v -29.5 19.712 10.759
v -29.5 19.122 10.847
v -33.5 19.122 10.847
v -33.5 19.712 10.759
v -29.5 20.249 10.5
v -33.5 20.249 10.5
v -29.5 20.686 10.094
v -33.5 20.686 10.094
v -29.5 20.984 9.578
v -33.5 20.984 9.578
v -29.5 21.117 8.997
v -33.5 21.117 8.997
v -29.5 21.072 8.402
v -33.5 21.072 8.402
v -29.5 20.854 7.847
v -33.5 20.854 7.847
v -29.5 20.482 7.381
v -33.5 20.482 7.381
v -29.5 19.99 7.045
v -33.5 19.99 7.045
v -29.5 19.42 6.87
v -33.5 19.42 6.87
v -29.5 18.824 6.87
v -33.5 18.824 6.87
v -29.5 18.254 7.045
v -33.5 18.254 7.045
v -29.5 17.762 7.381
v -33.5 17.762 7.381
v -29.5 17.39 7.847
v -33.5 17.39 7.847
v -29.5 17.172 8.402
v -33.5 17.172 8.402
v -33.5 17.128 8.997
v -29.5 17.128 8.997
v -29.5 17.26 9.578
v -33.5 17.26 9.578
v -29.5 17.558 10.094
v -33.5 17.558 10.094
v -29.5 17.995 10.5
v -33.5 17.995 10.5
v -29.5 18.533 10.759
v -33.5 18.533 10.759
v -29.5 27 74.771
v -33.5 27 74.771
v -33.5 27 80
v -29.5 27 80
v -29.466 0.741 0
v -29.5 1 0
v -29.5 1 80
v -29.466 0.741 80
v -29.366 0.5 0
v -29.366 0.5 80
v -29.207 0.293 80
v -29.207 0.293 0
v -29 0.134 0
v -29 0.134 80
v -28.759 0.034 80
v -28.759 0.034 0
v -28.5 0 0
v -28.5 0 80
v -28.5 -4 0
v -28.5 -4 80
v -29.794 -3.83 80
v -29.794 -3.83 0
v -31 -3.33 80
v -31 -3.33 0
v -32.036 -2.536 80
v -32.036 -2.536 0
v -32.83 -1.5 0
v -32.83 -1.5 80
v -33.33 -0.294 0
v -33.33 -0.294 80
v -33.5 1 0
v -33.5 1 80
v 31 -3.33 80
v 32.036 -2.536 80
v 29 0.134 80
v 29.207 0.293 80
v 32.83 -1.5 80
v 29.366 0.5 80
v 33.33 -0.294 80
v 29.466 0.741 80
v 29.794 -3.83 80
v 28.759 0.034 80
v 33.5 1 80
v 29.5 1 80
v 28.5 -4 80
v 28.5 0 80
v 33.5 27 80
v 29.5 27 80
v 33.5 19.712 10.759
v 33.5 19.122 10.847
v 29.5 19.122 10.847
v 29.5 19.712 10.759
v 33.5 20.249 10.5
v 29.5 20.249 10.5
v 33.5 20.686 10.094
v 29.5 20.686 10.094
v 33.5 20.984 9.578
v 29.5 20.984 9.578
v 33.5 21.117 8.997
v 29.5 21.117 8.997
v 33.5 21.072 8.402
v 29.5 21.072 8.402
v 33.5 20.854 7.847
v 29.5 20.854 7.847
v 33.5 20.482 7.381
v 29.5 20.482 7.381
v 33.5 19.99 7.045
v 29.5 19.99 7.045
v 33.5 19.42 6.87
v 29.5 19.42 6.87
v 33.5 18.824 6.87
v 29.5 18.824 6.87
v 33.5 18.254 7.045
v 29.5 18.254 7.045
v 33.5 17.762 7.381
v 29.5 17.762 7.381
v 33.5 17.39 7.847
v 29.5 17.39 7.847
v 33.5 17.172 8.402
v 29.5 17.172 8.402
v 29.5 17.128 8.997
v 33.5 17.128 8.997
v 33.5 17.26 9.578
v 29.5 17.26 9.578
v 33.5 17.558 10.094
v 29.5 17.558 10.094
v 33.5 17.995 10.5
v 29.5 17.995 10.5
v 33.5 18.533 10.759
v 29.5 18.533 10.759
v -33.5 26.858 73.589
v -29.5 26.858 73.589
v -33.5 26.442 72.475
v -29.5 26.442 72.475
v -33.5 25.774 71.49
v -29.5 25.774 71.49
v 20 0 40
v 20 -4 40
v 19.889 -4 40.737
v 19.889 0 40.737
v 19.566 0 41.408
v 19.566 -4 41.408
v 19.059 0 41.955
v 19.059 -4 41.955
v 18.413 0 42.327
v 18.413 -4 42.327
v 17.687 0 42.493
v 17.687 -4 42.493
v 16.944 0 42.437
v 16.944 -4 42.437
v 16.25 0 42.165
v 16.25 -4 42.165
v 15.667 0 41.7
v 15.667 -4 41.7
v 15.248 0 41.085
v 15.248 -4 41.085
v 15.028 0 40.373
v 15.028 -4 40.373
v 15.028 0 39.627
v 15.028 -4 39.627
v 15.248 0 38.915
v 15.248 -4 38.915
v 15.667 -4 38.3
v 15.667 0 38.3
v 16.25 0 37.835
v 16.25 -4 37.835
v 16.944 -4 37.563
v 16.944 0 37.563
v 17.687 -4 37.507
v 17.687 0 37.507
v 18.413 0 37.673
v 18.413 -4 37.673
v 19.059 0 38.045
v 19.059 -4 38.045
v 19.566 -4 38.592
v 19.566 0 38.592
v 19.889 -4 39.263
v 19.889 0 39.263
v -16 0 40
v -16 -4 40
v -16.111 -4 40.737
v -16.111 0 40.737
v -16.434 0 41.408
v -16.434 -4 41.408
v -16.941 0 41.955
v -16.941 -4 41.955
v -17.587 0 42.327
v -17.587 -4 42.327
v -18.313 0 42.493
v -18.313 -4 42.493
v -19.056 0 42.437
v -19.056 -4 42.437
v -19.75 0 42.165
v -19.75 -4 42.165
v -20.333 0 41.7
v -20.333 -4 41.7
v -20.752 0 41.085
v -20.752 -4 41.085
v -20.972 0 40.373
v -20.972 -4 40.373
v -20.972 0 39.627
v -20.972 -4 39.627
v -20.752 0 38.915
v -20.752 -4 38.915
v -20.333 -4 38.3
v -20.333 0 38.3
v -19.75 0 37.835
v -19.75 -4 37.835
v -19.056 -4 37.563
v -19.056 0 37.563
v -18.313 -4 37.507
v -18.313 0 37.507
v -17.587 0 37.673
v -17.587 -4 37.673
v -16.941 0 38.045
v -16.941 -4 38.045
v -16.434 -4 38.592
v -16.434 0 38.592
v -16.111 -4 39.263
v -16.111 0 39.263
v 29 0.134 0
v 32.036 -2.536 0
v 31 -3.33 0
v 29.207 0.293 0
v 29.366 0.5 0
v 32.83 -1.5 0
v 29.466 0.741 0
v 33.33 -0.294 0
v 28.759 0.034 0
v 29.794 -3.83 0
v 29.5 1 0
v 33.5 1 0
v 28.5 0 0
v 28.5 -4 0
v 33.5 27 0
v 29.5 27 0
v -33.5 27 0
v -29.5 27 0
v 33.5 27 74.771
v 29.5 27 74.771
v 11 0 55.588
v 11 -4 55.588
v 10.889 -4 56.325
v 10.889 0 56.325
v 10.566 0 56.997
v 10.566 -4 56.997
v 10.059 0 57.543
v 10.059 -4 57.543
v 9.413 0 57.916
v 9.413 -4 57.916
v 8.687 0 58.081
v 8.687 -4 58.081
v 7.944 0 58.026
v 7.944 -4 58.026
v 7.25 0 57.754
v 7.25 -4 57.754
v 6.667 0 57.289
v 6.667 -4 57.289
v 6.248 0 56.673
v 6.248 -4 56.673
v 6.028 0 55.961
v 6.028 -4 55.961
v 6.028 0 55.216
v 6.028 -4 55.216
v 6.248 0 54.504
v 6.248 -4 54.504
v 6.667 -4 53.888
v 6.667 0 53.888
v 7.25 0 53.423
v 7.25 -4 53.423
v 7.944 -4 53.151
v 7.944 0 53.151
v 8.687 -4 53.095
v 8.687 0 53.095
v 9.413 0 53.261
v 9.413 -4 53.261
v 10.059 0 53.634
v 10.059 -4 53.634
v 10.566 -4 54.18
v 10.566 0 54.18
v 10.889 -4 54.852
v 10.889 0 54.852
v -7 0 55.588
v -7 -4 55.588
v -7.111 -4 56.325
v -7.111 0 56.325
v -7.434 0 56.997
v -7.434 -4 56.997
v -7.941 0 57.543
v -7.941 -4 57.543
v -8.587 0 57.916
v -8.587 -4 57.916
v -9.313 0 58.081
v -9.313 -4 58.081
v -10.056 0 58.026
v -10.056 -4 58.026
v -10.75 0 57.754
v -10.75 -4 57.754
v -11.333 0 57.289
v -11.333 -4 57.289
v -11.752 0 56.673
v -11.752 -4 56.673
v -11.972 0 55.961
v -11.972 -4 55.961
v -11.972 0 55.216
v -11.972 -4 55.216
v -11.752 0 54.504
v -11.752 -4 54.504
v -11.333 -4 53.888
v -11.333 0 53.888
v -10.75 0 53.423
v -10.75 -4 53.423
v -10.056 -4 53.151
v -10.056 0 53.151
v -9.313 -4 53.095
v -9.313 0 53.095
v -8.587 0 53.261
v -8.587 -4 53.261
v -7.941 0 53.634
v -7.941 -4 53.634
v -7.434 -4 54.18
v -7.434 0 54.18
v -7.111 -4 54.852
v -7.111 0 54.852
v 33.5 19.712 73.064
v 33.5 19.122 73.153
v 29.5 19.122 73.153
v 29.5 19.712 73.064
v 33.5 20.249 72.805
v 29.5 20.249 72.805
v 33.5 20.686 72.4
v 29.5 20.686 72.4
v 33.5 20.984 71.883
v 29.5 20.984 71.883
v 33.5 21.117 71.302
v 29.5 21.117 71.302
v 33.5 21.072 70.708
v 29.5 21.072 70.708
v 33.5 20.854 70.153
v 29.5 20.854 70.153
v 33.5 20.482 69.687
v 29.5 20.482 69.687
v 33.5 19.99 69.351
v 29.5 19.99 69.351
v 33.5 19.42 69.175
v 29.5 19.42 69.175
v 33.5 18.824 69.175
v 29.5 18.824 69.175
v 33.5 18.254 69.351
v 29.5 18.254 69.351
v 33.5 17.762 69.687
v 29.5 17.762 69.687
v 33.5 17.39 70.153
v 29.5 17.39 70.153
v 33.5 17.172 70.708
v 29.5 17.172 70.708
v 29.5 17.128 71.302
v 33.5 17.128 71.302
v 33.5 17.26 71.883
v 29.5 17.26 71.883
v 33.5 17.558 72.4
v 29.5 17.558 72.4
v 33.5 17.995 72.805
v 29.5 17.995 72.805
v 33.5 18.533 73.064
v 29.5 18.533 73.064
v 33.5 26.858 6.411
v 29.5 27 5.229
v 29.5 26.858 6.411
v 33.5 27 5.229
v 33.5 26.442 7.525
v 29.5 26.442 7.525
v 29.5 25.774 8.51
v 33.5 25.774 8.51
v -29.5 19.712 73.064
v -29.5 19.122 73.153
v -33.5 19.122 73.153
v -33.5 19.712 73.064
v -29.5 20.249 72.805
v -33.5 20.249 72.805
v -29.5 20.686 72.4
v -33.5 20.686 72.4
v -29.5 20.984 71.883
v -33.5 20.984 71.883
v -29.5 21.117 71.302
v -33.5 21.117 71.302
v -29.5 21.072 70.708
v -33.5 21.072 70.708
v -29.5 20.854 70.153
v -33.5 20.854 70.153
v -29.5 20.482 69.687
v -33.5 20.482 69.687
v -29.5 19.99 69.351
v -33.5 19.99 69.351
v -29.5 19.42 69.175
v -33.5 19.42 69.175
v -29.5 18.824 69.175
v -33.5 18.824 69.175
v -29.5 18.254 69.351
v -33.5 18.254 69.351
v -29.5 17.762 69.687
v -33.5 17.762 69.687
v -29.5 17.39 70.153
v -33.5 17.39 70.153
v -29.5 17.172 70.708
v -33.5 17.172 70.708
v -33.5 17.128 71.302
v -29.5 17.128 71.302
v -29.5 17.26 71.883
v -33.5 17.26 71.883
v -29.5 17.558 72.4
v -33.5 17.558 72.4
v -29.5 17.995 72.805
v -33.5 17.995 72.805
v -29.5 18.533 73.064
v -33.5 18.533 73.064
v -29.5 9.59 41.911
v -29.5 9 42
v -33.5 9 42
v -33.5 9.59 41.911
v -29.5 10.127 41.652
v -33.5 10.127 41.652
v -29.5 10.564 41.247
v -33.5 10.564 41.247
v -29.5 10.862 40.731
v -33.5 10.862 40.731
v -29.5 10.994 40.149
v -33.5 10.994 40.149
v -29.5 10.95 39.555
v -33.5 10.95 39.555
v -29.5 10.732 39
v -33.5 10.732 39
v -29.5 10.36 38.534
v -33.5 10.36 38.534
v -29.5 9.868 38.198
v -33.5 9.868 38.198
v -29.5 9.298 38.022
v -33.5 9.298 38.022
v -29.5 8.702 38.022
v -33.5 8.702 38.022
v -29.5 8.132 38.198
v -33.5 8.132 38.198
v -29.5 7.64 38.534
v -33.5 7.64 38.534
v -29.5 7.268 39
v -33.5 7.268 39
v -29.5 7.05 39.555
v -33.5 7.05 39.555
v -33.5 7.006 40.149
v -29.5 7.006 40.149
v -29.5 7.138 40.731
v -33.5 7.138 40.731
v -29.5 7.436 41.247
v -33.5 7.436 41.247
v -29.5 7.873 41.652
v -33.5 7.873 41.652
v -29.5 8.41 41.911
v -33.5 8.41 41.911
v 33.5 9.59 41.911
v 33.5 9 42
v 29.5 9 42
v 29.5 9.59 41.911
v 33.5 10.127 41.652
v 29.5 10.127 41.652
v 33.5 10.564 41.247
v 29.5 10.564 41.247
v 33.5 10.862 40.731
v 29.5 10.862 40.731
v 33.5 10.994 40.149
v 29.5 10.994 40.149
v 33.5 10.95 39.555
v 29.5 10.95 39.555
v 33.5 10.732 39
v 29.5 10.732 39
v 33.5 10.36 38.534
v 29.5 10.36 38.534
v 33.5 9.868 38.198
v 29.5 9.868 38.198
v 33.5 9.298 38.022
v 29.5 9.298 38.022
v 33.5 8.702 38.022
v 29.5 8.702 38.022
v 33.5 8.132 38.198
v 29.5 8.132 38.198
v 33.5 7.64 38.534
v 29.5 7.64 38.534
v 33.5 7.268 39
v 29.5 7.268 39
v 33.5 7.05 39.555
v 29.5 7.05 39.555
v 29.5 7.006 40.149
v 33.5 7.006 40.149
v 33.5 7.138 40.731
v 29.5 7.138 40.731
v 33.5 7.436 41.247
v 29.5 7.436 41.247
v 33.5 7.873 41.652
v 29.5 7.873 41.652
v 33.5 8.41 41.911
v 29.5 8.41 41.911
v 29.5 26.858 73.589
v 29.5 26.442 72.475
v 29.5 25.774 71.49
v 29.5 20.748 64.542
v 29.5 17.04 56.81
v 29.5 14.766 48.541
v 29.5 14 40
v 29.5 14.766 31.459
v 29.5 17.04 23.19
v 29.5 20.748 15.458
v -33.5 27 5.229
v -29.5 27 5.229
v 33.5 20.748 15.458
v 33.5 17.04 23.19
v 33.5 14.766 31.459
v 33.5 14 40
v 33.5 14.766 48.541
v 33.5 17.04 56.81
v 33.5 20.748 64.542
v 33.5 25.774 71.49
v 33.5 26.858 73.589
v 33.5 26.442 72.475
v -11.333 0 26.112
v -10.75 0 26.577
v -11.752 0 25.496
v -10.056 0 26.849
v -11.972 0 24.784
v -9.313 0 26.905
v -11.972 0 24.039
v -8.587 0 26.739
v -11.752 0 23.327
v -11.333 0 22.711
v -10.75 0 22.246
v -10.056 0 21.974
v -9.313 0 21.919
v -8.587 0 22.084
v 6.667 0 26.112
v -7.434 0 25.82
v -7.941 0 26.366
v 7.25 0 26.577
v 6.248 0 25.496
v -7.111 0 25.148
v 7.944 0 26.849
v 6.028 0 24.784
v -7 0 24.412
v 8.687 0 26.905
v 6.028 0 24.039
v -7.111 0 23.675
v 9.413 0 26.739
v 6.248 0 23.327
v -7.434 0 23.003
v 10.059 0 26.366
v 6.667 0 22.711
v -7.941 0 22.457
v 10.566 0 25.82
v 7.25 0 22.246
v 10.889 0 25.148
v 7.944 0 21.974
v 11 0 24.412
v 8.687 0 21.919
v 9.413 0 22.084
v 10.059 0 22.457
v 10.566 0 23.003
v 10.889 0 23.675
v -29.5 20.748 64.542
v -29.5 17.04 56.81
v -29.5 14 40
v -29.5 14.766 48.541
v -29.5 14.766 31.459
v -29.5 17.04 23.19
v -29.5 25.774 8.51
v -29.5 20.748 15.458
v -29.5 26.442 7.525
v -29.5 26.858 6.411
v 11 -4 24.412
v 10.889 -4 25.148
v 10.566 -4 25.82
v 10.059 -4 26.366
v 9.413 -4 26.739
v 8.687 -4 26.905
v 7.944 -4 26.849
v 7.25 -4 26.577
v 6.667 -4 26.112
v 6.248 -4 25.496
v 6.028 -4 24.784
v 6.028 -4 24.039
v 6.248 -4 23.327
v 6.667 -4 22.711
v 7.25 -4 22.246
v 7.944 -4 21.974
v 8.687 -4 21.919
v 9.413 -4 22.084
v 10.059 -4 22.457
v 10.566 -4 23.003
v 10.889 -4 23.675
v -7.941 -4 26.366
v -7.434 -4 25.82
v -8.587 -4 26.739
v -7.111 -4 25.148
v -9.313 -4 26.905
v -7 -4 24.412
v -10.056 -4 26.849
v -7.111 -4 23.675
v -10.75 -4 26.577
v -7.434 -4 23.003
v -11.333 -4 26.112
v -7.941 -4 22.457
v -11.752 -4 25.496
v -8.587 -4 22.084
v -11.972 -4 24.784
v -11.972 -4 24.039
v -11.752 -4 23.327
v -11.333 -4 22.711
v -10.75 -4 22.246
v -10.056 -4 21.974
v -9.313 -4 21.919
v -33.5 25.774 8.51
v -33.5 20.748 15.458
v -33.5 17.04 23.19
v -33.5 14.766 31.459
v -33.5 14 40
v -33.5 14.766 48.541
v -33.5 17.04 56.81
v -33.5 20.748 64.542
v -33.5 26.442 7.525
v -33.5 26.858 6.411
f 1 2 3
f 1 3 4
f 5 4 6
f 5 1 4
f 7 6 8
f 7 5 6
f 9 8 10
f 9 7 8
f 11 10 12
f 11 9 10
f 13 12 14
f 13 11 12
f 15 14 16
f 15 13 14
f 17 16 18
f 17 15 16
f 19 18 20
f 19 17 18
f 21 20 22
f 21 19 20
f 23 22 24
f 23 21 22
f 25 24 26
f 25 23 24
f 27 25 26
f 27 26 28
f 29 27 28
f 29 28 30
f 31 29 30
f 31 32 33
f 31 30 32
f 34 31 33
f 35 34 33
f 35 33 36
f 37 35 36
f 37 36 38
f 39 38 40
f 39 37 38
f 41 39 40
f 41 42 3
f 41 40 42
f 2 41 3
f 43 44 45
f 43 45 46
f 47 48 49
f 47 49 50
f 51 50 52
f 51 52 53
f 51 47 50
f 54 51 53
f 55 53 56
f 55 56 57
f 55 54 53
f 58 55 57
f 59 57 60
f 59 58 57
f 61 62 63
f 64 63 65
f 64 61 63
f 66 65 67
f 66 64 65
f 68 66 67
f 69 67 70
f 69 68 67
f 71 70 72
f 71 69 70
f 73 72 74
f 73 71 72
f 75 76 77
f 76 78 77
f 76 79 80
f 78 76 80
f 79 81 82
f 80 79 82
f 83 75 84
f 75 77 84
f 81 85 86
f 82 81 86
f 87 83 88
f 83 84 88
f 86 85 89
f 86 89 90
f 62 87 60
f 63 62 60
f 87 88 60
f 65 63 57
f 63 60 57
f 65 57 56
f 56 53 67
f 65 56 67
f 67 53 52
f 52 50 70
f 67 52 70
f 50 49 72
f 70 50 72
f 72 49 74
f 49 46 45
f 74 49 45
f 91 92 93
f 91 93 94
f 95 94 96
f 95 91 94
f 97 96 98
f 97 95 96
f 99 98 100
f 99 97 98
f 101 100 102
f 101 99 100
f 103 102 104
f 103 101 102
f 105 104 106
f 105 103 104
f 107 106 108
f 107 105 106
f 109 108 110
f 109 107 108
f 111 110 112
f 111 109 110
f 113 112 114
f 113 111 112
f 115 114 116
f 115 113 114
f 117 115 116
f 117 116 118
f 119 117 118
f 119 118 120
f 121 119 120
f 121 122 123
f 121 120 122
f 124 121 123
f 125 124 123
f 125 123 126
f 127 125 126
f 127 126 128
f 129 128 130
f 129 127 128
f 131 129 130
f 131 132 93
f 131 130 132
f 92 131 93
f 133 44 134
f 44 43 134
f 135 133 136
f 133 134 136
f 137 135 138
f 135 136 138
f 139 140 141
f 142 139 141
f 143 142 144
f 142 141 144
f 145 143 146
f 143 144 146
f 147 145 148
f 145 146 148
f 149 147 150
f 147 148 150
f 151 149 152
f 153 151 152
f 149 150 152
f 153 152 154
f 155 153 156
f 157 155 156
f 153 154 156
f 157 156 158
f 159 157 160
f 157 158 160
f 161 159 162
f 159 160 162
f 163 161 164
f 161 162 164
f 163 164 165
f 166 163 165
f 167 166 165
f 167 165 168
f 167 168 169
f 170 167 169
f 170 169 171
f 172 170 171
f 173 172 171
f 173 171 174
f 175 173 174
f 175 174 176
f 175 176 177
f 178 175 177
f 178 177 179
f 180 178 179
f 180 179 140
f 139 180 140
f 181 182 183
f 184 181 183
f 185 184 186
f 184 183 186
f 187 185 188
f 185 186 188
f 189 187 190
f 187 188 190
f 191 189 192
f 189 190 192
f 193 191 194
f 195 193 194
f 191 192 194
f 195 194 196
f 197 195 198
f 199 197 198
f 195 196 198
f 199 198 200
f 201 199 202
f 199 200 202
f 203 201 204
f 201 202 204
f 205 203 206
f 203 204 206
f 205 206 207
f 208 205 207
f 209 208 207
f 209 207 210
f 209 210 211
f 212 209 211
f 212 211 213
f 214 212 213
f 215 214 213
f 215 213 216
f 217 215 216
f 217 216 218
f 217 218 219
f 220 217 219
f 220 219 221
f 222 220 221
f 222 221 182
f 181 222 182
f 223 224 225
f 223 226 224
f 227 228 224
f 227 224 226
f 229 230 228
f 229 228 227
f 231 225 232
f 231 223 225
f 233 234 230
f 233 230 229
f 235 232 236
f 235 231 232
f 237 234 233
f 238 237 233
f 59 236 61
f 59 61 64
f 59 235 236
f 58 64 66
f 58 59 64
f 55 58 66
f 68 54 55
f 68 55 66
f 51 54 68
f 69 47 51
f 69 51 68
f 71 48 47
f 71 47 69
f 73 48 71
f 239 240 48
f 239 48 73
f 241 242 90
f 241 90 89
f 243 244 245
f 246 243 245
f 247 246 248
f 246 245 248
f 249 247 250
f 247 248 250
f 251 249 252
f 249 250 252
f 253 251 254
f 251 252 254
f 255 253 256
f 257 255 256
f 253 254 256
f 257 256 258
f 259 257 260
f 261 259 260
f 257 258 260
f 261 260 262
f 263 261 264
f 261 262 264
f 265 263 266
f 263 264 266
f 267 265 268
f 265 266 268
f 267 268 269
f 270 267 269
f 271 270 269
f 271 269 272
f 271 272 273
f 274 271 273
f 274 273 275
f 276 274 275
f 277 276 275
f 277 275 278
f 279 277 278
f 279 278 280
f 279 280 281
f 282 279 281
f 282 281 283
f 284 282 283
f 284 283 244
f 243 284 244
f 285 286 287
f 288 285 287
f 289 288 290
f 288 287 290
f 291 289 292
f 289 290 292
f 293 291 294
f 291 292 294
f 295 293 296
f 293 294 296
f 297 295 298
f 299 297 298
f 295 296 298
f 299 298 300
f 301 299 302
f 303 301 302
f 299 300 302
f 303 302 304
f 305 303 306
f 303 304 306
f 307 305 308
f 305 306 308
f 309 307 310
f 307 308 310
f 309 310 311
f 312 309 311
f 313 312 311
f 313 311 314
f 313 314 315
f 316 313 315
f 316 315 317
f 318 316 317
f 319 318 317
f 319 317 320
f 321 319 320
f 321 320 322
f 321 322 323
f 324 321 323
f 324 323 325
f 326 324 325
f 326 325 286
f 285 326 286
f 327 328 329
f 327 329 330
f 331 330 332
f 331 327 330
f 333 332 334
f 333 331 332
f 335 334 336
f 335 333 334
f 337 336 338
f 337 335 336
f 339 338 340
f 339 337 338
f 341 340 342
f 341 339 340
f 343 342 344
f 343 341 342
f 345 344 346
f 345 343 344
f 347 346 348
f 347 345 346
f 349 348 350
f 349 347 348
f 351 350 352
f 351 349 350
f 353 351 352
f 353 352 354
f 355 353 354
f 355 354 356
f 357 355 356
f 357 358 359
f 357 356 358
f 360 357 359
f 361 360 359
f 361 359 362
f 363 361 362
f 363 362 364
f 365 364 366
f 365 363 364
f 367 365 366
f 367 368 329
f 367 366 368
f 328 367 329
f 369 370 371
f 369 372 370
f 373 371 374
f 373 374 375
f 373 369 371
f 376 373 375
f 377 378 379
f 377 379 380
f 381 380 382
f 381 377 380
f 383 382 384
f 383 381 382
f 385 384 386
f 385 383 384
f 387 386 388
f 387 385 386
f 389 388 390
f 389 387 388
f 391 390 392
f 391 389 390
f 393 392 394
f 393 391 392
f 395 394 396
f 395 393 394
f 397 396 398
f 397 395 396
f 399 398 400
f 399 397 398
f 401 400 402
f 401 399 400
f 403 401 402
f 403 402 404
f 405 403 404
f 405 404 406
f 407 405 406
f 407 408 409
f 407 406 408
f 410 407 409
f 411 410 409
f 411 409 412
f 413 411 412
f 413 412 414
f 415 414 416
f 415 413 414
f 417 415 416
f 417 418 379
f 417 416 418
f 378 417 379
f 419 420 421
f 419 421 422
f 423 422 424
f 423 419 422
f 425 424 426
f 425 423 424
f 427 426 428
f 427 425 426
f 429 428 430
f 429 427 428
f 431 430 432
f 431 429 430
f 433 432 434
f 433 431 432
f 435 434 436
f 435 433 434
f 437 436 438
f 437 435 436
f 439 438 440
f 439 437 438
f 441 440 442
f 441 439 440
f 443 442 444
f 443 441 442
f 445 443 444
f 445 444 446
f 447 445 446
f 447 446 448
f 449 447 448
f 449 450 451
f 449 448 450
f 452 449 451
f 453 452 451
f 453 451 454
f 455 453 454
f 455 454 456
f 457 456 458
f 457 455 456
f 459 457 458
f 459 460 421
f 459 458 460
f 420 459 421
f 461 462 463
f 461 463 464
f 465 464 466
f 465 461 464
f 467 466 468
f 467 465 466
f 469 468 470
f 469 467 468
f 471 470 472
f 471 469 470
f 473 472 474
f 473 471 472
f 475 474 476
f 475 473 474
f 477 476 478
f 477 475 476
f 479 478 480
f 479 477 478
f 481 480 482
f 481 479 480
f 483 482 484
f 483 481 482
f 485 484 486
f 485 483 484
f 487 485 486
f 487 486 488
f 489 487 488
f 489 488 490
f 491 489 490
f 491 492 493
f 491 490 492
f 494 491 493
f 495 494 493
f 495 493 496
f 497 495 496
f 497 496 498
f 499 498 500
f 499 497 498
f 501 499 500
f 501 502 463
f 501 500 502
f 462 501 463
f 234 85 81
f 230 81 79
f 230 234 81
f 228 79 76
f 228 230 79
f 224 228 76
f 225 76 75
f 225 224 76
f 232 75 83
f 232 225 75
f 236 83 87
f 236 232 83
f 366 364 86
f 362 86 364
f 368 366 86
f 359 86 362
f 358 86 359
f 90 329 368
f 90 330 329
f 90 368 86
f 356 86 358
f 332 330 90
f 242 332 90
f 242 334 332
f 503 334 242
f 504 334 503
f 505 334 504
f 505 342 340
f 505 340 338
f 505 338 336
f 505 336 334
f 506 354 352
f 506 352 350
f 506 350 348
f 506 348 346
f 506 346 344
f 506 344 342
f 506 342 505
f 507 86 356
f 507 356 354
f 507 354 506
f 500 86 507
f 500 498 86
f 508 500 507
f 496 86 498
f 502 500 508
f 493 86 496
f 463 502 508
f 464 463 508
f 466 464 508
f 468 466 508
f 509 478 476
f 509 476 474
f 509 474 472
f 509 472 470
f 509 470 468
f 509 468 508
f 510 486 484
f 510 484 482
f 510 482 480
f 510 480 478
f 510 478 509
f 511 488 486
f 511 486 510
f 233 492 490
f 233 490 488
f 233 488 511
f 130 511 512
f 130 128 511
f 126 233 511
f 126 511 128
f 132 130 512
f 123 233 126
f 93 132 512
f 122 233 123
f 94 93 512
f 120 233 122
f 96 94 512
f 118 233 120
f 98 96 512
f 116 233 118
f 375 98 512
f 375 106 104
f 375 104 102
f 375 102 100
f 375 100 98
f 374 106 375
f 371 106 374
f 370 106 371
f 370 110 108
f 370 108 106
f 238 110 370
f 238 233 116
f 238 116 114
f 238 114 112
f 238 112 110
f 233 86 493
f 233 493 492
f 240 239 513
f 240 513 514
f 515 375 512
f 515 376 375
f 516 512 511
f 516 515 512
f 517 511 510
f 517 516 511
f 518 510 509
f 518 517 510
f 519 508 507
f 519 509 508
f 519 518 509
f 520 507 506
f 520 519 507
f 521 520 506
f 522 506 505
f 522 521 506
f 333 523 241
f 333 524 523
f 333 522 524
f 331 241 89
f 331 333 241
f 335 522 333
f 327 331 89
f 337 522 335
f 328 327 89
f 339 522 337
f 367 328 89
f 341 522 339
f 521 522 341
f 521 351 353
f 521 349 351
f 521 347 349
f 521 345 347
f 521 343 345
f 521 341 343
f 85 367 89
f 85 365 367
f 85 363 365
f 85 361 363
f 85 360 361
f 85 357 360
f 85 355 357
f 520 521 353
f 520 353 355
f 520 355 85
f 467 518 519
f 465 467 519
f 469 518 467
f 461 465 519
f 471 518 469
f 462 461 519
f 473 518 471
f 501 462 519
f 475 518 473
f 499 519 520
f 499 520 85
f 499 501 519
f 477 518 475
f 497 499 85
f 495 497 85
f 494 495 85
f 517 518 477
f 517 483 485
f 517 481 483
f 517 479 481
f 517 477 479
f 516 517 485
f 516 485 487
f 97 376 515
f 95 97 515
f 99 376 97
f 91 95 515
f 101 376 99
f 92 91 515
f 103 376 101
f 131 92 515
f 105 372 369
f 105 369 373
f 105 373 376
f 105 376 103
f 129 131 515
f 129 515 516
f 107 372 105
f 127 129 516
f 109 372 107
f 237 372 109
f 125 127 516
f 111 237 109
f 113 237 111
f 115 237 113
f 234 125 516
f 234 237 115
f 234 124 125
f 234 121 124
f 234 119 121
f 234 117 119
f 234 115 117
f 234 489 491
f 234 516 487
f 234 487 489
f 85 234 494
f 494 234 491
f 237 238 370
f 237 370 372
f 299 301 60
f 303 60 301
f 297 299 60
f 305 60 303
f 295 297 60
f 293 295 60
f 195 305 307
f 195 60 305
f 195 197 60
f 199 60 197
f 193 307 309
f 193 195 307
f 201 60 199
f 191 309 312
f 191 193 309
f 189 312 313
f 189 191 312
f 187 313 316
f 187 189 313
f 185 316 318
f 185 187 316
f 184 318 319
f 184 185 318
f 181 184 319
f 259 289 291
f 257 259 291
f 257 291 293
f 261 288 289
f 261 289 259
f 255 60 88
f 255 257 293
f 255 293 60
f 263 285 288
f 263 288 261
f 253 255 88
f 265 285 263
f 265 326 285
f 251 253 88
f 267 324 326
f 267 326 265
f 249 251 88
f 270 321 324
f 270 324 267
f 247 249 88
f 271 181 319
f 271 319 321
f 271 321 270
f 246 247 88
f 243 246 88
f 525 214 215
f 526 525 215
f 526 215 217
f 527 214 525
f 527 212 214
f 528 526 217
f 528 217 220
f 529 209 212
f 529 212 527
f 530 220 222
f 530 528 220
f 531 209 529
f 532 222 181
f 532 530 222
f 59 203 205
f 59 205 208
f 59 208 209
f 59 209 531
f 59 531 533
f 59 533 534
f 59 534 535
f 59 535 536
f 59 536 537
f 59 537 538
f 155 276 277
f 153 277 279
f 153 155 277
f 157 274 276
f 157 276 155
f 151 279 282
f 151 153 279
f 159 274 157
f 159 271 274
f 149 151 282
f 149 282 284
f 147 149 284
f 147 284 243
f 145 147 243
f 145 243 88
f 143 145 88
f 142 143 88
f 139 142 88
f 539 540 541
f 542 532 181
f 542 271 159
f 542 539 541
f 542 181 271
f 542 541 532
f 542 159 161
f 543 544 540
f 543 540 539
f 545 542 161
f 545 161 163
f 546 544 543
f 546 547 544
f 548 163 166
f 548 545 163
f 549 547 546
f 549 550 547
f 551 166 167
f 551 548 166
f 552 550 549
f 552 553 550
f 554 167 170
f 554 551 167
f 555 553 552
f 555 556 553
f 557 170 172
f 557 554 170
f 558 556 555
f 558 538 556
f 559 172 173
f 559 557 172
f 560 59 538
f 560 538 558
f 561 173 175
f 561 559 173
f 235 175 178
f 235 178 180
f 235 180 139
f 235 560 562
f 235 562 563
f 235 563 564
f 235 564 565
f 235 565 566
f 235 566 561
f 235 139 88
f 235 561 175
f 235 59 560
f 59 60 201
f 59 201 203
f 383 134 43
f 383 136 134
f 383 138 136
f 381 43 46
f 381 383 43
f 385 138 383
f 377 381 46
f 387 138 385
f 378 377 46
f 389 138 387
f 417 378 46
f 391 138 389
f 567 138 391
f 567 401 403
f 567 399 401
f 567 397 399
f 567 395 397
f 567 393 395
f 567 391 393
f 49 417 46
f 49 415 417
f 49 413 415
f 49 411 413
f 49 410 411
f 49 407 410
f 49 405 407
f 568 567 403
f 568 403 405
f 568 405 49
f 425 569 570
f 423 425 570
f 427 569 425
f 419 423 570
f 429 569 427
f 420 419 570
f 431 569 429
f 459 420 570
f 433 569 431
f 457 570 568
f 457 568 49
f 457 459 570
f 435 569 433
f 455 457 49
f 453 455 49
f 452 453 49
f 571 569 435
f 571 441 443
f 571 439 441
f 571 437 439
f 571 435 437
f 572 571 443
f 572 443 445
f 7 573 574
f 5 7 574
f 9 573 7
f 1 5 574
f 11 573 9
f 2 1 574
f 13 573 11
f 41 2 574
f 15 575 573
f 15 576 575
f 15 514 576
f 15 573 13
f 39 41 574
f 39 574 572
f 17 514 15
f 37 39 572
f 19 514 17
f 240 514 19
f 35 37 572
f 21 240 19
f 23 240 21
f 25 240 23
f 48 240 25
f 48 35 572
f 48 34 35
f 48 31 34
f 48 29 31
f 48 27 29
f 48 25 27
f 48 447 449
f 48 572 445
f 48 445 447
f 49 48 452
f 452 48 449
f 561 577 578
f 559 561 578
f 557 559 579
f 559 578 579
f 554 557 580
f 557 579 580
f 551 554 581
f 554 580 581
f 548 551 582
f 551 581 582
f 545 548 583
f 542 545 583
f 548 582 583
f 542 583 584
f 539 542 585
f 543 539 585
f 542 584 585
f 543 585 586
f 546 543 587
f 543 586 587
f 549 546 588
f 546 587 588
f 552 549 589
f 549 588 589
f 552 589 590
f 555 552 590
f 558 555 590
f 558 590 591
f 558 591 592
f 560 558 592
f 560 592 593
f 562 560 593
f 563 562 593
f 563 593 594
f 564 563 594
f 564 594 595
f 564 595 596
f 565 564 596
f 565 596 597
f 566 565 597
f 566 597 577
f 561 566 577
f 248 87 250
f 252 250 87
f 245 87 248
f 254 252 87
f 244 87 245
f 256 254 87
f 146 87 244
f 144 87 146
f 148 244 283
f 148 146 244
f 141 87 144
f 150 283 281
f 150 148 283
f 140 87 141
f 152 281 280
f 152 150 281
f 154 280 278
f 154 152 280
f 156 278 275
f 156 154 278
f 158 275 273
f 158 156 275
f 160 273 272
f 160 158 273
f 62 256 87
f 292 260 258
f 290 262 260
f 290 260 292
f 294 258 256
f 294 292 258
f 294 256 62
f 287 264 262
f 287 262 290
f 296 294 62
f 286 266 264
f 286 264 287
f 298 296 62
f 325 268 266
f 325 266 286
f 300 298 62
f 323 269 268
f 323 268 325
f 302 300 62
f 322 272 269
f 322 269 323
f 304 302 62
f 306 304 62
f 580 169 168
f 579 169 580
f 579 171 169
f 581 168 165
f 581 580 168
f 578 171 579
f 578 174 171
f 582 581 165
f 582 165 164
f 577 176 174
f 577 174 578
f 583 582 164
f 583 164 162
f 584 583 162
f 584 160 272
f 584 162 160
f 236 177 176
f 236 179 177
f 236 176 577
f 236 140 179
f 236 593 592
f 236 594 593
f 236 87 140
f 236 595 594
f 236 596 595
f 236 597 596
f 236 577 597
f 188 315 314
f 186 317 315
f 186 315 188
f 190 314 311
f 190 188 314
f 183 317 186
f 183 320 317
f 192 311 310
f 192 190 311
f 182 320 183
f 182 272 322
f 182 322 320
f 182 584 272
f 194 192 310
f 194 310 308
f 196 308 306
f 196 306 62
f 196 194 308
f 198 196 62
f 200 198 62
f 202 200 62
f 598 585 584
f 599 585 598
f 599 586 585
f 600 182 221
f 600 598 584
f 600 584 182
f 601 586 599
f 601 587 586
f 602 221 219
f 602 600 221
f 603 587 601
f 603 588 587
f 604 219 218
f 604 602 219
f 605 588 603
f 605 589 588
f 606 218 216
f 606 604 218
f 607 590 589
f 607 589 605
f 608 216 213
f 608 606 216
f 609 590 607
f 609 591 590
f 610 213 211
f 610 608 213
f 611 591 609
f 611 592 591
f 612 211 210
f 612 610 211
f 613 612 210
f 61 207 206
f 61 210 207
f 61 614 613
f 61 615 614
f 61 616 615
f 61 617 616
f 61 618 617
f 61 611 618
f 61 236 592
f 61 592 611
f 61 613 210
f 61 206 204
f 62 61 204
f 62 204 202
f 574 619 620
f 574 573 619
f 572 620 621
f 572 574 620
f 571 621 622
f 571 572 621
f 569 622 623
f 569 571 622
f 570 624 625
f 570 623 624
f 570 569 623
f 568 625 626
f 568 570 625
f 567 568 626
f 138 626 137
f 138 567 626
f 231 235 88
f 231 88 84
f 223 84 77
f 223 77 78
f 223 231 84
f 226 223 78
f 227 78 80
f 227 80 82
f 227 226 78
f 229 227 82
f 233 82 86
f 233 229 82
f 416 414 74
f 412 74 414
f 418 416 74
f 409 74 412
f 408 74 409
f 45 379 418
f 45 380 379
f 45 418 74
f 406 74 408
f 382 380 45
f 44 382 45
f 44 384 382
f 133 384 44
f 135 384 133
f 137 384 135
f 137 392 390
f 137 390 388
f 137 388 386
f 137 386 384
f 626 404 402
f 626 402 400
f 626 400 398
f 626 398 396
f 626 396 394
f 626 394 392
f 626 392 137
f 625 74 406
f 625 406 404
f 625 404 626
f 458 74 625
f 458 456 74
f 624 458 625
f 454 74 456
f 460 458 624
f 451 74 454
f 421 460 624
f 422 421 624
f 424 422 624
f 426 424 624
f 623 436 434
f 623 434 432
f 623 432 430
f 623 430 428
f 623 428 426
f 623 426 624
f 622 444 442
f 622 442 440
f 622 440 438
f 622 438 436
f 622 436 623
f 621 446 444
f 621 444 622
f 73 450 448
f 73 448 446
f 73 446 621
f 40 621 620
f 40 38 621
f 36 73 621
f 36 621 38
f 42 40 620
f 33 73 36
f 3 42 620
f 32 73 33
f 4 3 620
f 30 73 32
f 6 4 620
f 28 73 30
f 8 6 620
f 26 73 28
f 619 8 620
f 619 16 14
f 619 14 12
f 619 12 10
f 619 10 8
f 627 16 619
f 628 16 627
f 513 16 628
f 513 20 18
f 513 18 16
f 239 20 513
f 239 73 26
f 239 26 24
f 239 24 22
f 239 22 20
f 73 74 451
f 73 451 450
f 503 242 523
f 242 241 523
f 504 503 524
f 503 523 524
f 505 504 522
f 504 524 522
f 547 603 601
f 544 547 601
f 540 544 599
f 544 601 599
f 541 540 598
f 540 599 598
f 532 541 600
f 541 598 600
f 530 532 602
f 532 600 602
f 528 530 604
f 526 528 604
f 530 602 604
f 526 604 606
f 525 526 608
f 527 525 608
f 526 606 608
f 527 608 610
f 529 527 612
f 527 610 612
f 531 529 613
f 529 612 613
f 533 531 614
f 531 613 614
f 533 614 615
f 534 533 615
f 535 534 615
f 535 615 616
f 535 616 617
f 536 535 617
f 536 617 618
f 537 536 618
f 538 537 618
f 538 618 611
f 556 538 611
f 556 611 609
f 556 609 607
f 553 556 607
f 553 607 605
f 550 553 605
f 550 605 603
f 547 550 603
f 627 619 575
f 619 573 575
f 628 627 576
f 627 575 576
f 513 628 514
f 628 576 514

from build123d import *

# Parameters (mm, degrees)
SM_BASE_FLANGE_1_DEPTH   = 80
CUT_EXTRUDE_3_DEPTH      = 108.786826653
CUT_EXTRUDE_3_DEPTH_BACK = 108.786826653
SKETCH_6_R               = 48
SKETCH_6_R_2             = 2
FILLET_1_R               = 5
SKETCH_9_R               = 2.5
CUT_EXTRUDE_4_DEPTH      = 93.104560148


# Sheet-metal steps are written as plain solids
with BuildPart() as part:
    # Sketch 1 → Базовая кромка1 (new body)
    with BuildSketch(Plane.XY):
        with BuildLine():
            Line((-29.5, 27), (-29.5, 1))
            ThreePointArc((-29.5, 1), (-29.207106781, 0.292893219), (-28.5, 0))
            Line((-28.5, 0), (28.5, 0))
            ThreePointArc((28.5, 0), (29.207106781, 0.292893219), (29.5, 1))
            Line((29.5, 1), (29.5, 27))
            Line((29.5, 27), (33.5, 27))
            Line((33.5, 27), (33.5, 1))
            ThreePointArc((33.5, 1), (32.035533906, -2.535533906), (28.5, -4))
            Line((28.5, -4), (-28.5, -4))
            ThreePointArc((-28.5, -4), (-32.035533906, -2.535533906), (-33.5, 1))
            Line((-33.5, 1), (-33.5, 27))
            Line((-33.5, 27), (-29.5, 27))
        make_face()
    extrude(amount=SM_BASE_FLANGE_1_DEPTH)

    # Эскиз6 → Вырез-Вытянуть3 (cut, two sides: drawn at the far end of the back side and taken through both)
    with BuildSketch(Plane.ZY.offset(33.5).offset(-CUT_EXTRUDE_3_DEPTH_BACK)):
        with Locations((40, 62)):
            Circle(SKETCH_6_R)
        with Locations((40, 9)):
            Circle(SKETCH_6_R_2)
        with Locations((8.847381628, 19.122099298)):
            Circle(SKETCH_6_R_2)
        with Locations((71.152618372, 19.122099298)):
            Circle(SKETCH_6_R_2)
    extrude(amount=CUT_EXTRUDE_3_DEPTH + CUT_EXTRUDE_3_DEPTH_BACK, mode=Mode.SUBTRACT)

    # Скругление1
    fillet_1_edges = [part.edges().sort_by_distance(p)[0] for p in [
        (31.5, 27, 7.151864589),
        (31.5, 27, 72.848135411),
        (-31.5, 27, 7.151864589),
        (-31.5, 27, 72.848135411),
    ]]
    fillet(fillet_1_edges, radius=FILLET_1_R)

    # Эскиз9 → Вырез-Вытянуть4 (cut, through all)
    with BuildSketch(Plane.XZ.offset(4)):
        with Locations((17.5, 40)):
            Circle(SKETCH_9_R)
        with Locations((8.5, 24.411542732)):
            Circle(SKETCH_9_R)
        with Locations((-9.5, 24.411542732)):
            Circle(SKETCH_9_R)
        with Locations((-18.5, 40)):
            Circle(SKETCH_9_R)
        with Locations((-9.5, 55.588457268)):
            Circle(SKETCH_9_R)
        with Locations((8.5, 55.588457268)):
            Circle(SKETCH_9_R)
    extrude(amount=-CUT_EXTRUDE_4_DEPTH, mode=Mode.SUBTRACT)


solid = part.part
